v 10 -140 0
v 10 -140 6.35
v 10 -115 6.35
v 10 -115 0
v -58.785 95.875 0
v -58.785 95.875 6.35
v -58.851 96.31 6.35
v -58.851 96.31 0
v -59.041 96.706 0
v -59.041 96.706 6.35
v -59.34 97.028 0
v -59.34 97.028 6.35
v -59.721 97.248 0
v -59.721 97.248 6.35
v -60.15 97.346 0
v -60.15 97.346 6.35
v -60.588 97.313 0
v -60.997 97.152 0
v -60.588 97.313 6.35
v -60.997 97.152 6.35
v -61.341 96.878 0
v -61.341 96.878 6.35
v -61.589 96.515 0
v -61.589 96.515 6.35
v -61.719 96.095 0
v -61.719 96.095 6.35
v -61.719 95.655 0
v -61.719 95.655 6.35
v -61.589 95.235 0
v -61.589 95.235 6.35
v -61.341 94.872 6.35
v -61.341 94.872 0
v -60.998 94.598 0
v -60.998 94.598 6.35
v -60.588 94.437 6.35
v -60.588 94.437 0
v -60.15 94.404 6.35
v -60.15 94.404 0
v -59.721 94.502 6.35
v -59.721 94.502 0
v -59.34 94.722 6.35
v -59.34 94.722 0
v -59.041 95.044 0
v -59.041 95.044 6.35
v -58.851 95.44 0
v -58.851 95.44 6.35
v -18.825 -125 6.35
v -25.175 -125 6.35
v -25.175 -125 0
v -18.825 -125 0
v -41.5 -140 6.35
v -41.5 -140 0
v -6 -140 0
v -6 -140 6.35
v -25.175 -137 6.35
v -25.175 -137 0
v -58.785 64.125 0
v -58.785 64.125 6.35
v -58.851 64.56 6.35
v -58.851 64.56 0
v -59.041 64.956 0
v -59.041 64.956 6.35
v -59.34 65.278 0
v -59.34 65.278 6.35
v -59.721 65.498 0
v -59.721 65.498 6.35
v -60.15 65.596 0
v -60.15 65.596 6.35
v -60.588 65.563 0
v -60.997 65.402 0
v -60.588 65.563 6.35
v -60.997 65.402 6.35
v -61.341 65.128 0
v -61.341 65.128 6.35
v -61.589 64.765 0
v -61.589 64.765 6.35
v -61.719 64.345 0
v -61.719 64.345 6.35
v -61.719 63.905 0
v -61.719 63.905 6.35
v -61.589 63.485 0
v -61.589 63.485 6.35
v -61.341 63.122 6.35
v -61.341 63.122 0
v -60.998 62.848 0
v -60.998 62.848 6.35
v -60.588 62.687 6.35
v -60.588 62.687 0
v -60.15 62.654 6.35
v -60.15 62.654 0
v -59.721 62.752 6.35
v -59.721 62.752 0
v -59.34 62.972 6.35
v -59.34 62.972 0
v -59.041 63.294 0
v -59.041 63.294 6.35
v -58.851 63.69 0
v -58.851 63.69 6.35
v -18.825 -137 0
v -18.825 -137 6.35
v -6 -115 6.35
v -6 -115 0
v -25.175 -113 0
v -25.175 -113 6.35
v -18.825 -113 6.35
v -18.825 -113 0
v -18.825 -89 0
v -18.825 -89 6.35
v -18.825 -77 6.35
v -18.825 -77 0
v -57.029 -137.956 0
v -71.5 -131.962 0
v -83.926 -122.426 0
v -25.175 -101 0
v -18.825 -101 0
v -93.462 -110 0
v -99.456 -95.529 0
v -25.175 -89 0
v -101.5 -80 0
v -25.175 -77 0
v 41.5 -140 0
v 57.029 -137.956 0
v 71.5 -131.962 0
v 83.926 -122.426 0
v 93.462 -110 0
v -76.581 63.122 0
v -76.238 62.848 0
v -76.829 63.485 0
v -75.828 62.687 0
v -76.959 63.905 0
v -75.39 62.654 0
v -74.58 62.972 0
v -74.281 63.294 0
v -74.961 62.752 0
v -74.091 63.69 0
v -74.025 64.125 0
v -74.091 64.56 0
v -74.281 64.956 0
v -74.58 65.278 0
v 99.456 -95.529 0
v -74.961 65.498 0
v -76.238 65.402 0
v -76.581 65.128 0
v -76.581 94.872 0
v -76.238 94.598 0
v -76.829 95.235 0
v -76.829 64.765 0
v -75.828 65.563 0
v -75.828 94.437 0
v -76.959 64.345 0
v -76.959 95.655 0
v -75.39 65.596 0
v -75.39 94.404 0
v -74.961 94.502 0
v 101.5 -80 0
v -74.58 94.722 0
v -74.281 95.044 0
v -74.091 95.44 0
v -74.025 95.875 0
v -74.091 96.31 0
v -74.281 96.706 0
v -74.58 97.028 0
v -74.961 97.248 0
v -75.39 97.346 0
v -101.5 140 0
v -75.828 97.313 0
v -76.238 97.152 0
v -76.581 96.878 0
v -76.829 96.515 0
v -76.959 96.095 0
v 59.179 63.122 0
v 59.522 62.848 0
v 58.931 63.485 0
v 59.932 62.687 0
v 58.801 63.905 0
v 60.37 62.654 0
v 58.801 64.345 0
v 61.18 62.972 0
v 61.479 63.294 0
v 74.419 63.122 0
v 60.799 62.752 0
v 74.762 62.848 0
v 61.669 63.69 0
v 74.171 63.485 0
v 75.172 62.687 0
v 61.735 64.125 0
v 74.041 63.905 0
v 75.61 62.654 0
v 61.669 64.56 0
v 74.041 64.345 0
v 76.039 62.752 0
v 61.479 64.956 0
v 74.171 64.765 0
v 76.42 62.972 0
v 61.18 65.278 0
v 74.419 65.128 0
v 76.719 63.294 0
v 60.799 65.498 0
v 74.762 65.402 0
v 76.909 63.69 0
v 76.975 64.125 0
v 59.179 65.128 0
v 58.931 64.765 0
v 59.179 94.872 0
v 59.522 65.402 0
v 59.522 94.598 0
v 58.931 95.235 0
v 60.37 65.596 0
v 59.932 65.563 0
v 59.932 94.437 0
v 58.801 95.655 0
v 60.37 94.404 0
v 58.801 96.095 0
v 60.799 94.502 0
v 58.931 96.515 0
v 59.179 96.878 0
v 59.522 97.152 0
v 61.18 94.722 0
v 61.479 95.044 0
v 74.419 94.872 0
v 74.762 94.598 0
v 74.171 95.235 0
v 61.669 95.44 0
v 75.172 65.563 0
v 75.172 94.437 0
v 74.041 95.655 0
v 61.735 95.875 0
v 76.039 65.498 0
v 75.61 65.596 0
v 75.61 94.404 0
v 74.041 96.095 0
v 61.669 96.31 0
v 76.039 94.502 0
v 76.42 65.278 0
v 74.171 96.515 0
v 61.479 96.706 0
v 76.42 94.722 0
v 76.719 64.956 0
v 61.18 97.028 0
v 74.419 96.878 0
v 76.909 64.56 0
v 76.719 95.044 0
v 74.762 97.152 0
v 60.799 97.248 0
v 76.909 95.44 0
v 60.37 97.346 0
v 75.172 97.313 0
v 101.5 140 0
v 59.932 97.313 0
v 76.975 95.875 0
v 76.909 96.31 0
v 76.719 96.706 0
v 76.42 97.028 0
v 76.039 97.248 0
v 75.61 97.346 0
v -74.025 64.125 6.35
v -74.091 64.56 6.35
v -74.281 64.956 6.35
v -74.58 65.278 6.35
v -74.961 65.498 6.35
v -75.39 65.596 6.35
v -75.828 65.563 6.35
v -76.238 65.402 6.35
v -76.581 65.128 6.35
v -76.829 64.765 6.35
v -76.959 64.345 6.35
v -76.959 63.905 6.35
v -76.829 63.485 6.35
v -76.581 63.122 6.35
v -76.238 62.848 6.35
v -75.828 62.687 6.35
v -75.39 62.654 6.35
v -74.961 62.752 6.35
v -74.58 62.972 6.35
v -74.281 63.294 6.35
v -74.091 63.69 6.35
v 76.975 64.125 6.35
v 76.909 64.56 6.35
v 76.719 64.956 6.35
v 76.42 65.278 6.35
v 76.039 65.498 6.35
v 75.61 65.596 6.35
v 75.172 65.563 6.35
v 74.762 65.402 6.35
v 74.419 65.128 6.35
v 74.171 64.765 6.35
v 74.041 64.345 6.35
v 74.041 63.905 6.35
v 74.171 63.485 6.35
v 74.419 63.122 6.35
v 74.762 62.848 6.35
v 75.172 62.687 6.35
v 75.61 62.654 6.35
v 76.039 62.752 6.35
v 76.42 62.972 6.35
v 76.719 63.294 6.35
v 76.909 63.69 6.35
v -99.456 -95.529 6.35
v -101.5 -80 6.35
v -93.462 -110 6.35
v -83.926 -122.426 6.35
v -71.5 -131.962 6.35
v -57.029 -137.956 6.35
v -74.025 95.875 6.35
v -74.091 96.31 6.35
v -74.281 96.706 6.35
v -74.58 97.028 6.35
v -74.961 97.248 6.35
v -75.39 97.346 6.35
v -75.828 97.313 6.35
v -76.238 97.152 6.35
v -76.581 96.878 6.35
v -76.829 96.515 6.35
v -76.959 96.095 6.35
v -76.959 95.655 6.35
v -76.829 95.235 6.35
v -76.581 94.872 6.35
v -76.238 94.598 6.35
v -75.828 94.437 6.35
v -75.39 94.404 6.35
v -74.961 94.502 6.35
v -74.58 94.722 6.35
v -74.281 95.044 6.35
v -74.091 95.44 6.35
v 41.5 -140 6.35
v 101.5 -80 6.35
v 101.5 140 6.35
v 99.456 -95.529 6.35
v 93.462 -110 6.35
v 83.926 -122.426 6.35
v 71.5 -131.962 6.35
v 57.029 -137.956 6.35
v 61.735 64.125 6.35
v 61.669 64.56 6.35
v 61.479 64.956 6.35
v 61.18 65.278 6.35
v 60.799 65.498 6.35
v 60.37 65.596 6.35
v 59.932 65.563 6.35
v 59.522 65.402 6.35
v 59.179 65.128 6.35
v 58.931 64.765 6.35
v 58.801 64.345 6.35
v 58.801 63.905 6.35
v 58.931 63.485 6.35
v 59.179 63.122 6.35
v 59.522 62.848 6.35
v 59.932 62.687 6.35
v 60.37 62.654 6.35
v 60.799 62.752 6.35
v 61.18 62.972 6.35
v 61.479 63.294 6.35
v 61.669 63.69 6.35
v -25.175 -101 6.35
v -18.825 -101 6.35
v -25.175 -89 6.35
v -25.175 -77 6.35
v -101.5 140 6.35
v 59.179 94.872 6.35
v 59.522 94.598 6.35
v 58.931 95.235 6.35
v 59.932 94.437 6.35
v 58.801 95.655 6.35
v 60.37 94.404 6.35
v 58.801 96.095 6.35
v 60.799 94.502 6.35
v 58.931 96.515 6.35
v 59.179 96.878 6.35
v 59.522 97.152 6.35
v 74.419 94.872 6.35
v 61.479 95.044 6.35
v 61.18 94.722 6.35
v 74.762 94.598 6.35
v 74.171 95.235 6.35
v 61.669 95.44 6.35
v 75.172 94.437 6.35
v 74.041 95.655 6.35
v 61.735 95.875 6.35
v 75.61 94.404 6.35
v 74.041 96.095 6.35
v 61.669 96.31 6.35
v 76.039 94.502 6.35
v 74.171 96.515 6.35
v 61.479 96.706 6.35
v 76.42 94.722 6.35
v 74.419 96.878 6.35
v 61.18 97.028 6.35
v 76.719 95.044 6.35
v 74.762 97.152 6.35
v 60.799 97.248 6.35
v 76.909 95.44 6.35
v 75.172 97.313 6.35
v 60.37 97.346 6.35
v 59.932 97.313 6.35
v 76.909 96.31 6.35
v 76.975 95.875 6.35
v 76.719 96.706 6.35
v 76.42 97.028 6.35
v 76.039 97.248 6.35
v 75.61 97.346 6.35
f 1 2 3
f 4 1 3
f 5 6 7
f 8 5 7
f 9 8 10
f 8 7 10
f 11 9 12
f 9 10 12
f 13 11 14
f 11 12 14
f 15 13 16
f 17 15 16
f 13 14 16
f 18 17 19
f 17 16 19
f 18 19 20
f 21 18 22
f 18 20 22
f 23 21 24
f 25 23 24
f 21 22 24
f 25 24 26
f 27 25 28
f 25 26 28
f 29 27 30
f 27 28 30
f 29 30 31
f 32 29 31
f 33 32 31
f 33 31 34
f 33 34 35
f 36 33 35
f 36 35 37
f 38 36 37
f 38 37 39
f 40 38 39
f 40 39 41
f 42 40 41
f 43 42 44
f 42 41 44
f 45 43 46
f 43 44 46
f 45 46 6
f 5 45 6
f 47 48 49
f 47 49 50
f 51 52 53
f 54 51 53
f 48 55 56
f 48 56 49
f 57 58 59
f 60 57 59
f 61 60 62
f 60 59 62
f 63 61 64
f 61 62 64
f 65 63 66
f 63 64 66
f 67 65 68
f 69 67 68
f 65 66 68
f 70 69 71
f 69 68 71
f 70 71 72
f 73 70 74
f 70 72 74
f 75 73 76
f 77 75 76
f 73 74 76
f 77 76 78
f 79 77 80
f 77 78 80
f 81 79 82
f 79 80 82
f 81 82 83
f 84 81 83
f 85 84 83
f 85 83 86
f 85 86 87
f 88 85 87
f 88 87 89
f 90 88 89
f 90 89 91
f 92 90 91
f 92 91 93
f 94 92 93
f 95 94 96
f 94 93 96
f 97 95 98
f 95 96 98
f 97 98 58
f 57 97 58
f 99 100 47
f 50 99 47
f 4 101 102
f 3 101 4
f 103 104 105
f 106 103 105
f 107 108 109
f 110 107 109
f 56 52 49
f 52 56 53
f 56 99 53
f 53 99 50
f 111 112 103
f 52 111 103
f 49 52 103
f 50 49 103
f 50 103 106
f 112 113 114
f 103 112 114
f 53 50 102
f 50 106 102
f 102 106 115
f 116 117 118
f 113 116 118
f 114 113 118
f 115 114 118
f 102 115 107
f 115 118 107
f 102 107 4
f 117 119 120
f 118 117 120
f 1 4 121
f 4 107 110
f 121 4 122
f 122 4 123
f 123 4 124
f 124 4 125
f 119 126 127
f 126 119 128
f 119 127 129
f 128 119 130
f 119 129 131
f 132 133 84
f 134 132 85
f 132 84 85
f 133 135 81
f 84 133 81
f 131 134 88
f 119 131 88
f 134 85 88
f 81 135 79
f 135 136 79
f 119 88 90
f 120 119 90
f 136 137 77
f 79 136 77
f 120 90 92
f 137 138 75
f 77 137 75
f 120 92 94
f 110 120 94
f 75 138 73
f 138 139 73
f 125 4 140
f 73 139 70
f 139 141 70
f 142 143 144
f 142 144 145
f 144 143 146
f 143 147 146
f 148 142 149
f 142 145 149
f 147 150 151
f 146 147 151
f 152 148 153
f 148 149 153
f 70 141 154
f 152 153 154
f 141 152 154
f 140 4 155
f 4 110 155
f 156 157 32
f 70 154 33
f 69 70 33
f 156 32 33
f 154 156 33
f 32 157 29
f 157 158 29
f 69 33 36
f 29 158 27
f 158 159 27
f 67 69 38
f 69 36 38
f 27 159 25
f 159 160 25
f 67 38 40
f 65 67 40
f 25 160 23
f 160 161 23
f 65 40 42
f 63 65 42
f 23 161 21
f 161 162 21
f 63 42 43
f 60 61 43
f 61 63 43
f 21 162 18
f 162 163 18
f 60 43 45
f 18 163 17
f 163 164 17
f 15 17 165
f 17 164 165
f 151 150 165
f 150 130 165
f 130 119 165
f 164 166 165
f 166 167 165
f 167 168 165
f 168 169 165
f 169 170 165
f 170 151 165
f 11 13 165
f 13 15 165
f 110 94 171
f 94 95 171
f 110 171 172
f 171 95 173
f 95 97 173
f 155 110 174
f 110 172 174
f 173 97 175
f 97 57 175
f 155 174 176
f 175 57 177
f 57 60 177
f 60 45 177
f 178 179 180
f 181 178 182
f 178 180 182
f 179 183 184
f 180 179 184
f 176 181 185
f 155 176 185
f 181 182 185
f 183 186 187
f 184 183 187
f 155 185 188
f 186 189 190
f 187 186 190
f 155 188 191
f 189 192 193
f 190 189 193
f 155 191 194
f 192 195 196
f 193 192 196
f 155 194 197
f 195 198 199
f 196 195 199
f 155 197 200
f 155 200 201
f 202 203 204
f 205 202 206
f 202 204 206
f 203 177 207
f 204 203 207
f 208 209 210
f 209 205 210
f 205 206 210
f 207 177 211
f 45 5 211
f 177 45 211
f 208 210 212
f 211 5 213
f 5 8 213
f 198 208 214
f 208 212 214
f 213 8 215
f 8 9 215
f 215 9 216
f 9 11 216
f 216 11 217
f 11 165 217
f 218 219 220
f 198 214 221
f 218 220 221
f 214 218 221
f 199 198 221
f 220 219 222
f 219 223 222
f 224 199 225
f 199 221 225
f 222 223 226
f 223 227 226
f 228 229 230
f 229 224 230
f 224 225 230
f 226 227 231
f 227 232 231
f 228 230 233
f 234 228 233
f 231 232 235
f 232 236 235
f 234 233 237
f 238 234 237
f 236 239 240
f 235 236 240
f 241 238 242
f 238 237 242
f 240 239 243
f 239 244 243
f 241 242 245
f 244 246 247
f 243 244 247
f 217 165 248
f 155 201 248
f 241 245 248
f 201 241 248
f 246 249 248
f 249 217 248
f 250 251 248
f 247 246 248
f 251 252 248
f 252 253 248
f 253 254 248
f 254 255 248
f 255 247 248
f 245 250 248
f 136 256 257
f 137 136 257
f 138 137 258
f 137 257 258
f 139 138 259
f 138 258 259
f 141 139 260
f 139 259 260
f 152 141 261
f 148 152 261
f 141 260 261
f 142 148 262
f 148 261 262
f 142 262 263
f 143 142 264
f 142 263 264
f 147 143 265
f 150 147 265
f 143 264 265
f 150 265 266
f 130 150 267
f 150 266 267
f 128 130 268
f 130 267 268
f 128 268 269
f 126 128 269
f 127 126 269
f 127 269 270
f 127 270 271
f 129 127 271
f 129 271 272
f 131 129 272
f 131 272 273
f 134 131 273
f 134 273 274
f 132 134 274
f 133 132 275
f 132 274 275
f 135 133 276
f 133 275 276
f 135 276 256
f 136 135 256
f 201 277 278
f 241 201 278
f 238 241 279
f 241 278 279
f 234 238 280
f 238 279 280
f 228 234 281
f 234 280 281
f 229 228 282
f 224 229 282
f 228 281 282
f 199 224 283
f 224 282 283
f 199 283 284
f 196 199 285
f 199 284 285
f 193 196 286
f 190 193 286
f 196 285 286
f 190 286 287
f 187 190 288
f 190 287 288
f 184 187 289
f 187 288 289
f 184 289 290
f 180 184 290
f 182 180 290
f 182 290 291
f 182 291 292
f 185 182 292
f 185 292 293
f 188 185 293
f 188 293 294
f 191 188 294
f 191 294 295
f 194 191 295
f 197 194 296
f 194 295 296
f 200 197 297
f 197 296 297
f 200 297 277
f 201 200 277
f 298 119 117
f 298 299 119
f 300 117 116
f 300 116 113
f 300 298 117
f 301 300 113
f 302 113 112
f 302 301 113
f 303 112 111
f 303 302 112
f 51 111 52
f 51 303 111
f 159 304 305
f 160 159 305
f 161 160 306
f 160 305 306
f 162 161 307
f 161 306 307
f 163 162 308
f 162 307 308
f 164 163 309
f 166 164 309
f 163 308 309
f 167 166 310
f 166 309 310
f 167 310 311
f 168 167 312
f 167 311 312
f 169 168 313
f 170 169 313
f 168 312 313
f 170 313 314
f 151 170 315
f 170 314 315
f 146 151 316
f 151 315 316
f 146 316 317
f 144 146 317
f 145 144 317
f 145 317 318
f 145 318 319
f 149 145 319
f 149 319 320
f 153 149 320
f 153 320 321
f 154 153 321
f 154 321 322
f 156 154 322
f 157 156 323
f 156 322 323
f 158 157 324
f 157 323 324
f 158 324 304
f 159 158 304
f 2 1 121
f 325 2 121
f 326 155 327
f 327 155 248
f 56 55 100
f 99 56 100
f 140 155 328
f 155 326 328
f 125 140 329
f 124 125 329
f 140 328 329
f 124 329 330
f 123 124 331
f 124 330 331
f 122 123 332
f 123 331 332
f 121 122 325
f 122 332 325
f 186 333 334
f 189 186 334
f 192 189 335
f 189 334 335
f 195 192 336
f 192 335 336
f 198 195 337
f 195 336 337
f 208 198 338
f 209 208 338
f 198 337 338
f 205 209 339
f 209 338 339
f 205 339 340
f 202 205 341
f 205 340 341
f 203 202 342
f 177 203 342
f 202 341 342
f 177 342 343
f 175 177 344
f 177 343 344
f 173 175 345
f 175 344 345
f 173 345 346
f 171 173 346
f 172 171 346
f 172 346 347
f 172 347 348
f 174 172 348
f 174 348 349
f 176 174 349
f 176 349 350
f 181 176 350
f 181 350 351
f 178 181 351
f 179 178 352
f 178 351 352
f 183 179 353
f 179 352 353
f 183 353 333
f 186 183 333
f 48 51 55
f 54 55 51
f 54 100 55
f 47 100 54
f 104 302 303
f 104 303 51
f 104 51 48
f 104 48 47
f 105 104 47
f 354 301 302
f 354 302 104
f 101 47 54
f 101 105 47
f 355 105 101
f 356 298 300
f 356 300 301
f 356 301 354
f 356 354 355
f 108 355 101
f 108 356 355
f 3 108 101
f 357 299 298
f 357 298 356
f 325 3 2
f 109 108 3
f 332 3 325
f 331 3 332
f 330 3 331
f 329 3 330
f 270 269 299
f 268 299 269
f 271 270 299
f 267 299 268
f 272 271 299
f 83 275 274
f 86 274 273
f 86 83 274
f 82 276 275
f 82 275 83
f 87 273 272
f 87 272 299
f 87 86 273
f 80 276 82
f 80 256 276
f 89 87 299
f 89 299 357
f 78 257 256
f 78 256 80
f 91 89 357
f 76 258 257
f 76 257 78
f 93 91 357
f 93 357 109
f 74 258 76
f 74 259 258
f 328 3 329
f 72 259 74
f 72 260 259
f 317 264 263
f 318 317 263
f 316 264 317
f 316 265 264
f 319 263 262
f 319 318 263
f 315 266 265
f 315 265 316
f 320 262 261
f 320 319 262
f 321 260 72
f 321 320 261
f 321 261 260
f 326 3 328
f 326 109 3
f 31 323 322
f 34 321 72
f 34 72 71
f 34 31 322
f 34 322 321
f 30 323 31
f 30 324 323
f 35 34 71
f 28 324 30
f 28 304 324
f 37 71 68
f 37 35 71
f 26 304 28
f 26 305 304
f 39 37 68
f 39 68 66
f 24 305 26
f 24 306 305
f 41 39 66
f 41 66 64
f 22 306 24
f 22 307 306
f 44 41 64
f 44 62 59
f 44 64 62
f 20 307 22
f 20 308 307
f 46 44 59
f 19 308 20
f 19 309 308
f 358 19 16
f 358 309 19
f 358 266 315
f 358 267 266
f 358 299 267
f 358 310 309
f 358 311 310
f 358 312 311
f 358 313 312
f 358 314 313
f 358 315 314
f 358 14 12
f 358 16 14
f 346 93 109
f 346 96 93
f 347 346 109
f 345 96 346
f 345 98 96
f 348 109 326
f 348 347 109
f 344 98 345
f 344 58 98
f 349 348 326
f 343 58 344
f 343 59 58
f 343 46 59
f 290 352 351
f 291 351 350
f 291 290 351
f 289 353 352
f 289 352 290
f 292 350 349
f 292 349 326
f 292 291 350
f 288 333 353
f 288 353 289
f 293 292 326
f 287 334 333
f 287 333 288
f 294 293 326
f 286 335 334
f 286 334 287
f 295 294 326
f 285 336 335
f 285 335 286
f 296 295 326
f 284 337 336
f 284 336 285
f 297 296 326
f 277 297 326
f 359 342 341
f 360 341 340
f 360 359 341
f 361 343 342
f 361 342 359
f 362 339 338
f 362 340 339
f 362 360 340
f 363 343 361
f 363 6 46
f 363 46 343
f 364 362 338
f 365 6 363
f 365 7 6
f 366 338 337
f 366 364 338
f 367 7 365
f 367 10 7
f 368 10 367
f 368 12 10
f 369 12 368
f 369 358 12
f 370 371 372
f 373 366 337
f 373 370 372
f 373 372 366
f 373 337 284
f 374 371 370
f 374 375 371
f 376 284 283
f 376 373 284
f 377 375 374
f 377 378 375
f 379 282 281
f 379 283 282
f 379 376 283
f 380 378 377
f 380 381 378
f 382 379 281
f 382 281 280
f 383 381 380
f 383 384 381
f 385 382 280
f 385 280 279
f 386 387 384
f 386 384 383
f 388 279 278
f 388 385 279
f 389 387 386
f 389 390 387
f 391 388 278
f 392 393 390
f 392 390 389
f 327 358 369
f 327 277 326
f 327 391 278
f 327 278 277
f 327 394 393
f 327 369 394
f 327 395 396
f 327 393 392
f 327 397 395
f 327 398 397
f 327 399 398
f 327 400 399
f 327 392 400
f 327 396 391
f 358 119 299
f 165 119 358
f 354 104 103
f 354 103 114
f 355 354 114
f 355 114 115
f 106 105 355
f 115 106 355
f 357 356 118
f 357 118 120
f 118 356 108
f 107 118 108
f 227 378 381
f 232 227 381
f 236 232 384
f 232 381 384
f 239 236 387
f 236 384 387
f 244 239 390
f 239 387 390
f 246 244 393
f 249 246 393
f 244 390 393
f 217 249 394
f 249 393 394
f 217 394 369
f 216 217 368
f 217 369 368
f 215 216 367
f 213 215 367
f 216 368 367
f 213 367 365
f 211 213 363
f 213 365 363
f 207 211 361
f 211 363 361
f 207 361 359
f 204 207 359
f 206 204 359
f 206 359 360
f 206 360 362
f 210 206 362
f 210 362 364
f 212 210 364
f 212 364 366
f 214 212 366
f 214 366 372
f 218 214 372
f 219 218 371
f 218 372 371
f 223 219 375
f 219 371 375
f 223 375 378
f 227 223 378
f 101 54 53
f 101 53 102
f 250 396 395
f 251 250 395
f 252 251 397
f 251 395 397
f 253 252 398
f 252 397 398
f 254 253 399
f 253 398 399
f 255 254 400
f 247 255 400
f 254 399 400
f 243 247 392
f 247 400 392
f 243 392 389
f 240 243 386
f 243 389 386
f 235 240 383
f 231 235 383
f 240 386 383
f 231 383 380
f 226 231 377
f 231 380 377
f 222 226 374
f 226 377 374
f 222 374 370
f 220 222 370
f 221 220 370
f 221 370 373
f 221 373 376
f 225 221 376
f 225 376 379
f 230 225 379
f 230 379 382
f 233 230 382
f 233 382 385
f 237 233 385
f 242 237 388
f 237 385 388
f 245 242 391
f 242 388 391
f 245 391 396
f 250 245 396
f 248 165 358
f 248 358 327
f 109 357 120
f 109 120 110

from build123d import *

# Parameters (mm, degrees)
SKETCH1_W           = 203
SKETCH1_H           = 280
BOSS_EXTRUDE1_DEPTH = 6.35
SKETCH2_R           = 1.475
CUT_EXTRUDE1_DEPTH  = 6.35
SKETCH3_W           = 6.35
SKETCH3_H           = 12
SKETCH3_W_2         = 16
SKETCH3_H_2         = 25
CUT_EXTRUDE2_DEPTH  = 6.35
FILLET1_R           = 60


with BuildPart() as part:
    # Sketch1 → Boss-Extrude1 (new body)
    with BuildSketch(Plane.XY):
        Rectangle(SKETCH1_W, SKETCH1_H)
    extrude(amount=BOSS_EXTRUDE1_DEPTH)

    # Sketch2 → Cut-Extrude1 (cut)
    with BuildSketch(Plane.XY.offset(6.35)):
        with Locations((60.26, 95.875)):
            Circle(SKETCH2_R)
        with Locations((75.5, 95.875)):
            Circle(SKETCH2_R)
        with Locations((60.26, 64.125)):
            Circle(SKETCH2_R)
        with Locations((75.5, 64.125)):
            Circle(SKETCH2_R)
        with Locations((-75.5, 64.125)):
            Circle(SKETCH2_R)
        with Locations((-60.26, 64.125)):
            Circle(SKETCH2_R)
        with Locations((-75.5, 95.875)):
            Circle(SKETCH2_R)
        with Locations((-60.26, 95.875)):
            Circle(SKETCH2_R)
    extrude(amount=-CUT_EXTRUDE1_DEPTH, mode=Mode.SUBTRACT)

    # Sketch3 → Cut-Extrude2 (cut)
    with BuildSketch(Plane.XY.offset(6.35)):
        with Locations((-22, -131)):
            Rectangle(SKETCH3_W, SKETCH3_H)
        with Locations((-22, -107)):
            Rectangle(SKETCH3_W, SKETCH3_H)
        with Locations((-22, -83)):
            Rectangle(SKETCH3_W, SKETCH3_H)
        with Locations((2, -127.5)):
            Rectangle(SKETCH3_W_2, SKETCH3_H_2)
    extrude(amount=-CUT_EXTRUDE2_DEPTH, mode=Mode.SUBTRACT)

    # Fillet1
    fillet1_edges = [part.edges().sort_by_distance(p)[0] for p in [
        (101.5, -140, 3.175),
        (-101.5, -140, 3.175),
    ]]
    fillet(fillet1_edges, radius=FILLET1_R)


solid = part.part
